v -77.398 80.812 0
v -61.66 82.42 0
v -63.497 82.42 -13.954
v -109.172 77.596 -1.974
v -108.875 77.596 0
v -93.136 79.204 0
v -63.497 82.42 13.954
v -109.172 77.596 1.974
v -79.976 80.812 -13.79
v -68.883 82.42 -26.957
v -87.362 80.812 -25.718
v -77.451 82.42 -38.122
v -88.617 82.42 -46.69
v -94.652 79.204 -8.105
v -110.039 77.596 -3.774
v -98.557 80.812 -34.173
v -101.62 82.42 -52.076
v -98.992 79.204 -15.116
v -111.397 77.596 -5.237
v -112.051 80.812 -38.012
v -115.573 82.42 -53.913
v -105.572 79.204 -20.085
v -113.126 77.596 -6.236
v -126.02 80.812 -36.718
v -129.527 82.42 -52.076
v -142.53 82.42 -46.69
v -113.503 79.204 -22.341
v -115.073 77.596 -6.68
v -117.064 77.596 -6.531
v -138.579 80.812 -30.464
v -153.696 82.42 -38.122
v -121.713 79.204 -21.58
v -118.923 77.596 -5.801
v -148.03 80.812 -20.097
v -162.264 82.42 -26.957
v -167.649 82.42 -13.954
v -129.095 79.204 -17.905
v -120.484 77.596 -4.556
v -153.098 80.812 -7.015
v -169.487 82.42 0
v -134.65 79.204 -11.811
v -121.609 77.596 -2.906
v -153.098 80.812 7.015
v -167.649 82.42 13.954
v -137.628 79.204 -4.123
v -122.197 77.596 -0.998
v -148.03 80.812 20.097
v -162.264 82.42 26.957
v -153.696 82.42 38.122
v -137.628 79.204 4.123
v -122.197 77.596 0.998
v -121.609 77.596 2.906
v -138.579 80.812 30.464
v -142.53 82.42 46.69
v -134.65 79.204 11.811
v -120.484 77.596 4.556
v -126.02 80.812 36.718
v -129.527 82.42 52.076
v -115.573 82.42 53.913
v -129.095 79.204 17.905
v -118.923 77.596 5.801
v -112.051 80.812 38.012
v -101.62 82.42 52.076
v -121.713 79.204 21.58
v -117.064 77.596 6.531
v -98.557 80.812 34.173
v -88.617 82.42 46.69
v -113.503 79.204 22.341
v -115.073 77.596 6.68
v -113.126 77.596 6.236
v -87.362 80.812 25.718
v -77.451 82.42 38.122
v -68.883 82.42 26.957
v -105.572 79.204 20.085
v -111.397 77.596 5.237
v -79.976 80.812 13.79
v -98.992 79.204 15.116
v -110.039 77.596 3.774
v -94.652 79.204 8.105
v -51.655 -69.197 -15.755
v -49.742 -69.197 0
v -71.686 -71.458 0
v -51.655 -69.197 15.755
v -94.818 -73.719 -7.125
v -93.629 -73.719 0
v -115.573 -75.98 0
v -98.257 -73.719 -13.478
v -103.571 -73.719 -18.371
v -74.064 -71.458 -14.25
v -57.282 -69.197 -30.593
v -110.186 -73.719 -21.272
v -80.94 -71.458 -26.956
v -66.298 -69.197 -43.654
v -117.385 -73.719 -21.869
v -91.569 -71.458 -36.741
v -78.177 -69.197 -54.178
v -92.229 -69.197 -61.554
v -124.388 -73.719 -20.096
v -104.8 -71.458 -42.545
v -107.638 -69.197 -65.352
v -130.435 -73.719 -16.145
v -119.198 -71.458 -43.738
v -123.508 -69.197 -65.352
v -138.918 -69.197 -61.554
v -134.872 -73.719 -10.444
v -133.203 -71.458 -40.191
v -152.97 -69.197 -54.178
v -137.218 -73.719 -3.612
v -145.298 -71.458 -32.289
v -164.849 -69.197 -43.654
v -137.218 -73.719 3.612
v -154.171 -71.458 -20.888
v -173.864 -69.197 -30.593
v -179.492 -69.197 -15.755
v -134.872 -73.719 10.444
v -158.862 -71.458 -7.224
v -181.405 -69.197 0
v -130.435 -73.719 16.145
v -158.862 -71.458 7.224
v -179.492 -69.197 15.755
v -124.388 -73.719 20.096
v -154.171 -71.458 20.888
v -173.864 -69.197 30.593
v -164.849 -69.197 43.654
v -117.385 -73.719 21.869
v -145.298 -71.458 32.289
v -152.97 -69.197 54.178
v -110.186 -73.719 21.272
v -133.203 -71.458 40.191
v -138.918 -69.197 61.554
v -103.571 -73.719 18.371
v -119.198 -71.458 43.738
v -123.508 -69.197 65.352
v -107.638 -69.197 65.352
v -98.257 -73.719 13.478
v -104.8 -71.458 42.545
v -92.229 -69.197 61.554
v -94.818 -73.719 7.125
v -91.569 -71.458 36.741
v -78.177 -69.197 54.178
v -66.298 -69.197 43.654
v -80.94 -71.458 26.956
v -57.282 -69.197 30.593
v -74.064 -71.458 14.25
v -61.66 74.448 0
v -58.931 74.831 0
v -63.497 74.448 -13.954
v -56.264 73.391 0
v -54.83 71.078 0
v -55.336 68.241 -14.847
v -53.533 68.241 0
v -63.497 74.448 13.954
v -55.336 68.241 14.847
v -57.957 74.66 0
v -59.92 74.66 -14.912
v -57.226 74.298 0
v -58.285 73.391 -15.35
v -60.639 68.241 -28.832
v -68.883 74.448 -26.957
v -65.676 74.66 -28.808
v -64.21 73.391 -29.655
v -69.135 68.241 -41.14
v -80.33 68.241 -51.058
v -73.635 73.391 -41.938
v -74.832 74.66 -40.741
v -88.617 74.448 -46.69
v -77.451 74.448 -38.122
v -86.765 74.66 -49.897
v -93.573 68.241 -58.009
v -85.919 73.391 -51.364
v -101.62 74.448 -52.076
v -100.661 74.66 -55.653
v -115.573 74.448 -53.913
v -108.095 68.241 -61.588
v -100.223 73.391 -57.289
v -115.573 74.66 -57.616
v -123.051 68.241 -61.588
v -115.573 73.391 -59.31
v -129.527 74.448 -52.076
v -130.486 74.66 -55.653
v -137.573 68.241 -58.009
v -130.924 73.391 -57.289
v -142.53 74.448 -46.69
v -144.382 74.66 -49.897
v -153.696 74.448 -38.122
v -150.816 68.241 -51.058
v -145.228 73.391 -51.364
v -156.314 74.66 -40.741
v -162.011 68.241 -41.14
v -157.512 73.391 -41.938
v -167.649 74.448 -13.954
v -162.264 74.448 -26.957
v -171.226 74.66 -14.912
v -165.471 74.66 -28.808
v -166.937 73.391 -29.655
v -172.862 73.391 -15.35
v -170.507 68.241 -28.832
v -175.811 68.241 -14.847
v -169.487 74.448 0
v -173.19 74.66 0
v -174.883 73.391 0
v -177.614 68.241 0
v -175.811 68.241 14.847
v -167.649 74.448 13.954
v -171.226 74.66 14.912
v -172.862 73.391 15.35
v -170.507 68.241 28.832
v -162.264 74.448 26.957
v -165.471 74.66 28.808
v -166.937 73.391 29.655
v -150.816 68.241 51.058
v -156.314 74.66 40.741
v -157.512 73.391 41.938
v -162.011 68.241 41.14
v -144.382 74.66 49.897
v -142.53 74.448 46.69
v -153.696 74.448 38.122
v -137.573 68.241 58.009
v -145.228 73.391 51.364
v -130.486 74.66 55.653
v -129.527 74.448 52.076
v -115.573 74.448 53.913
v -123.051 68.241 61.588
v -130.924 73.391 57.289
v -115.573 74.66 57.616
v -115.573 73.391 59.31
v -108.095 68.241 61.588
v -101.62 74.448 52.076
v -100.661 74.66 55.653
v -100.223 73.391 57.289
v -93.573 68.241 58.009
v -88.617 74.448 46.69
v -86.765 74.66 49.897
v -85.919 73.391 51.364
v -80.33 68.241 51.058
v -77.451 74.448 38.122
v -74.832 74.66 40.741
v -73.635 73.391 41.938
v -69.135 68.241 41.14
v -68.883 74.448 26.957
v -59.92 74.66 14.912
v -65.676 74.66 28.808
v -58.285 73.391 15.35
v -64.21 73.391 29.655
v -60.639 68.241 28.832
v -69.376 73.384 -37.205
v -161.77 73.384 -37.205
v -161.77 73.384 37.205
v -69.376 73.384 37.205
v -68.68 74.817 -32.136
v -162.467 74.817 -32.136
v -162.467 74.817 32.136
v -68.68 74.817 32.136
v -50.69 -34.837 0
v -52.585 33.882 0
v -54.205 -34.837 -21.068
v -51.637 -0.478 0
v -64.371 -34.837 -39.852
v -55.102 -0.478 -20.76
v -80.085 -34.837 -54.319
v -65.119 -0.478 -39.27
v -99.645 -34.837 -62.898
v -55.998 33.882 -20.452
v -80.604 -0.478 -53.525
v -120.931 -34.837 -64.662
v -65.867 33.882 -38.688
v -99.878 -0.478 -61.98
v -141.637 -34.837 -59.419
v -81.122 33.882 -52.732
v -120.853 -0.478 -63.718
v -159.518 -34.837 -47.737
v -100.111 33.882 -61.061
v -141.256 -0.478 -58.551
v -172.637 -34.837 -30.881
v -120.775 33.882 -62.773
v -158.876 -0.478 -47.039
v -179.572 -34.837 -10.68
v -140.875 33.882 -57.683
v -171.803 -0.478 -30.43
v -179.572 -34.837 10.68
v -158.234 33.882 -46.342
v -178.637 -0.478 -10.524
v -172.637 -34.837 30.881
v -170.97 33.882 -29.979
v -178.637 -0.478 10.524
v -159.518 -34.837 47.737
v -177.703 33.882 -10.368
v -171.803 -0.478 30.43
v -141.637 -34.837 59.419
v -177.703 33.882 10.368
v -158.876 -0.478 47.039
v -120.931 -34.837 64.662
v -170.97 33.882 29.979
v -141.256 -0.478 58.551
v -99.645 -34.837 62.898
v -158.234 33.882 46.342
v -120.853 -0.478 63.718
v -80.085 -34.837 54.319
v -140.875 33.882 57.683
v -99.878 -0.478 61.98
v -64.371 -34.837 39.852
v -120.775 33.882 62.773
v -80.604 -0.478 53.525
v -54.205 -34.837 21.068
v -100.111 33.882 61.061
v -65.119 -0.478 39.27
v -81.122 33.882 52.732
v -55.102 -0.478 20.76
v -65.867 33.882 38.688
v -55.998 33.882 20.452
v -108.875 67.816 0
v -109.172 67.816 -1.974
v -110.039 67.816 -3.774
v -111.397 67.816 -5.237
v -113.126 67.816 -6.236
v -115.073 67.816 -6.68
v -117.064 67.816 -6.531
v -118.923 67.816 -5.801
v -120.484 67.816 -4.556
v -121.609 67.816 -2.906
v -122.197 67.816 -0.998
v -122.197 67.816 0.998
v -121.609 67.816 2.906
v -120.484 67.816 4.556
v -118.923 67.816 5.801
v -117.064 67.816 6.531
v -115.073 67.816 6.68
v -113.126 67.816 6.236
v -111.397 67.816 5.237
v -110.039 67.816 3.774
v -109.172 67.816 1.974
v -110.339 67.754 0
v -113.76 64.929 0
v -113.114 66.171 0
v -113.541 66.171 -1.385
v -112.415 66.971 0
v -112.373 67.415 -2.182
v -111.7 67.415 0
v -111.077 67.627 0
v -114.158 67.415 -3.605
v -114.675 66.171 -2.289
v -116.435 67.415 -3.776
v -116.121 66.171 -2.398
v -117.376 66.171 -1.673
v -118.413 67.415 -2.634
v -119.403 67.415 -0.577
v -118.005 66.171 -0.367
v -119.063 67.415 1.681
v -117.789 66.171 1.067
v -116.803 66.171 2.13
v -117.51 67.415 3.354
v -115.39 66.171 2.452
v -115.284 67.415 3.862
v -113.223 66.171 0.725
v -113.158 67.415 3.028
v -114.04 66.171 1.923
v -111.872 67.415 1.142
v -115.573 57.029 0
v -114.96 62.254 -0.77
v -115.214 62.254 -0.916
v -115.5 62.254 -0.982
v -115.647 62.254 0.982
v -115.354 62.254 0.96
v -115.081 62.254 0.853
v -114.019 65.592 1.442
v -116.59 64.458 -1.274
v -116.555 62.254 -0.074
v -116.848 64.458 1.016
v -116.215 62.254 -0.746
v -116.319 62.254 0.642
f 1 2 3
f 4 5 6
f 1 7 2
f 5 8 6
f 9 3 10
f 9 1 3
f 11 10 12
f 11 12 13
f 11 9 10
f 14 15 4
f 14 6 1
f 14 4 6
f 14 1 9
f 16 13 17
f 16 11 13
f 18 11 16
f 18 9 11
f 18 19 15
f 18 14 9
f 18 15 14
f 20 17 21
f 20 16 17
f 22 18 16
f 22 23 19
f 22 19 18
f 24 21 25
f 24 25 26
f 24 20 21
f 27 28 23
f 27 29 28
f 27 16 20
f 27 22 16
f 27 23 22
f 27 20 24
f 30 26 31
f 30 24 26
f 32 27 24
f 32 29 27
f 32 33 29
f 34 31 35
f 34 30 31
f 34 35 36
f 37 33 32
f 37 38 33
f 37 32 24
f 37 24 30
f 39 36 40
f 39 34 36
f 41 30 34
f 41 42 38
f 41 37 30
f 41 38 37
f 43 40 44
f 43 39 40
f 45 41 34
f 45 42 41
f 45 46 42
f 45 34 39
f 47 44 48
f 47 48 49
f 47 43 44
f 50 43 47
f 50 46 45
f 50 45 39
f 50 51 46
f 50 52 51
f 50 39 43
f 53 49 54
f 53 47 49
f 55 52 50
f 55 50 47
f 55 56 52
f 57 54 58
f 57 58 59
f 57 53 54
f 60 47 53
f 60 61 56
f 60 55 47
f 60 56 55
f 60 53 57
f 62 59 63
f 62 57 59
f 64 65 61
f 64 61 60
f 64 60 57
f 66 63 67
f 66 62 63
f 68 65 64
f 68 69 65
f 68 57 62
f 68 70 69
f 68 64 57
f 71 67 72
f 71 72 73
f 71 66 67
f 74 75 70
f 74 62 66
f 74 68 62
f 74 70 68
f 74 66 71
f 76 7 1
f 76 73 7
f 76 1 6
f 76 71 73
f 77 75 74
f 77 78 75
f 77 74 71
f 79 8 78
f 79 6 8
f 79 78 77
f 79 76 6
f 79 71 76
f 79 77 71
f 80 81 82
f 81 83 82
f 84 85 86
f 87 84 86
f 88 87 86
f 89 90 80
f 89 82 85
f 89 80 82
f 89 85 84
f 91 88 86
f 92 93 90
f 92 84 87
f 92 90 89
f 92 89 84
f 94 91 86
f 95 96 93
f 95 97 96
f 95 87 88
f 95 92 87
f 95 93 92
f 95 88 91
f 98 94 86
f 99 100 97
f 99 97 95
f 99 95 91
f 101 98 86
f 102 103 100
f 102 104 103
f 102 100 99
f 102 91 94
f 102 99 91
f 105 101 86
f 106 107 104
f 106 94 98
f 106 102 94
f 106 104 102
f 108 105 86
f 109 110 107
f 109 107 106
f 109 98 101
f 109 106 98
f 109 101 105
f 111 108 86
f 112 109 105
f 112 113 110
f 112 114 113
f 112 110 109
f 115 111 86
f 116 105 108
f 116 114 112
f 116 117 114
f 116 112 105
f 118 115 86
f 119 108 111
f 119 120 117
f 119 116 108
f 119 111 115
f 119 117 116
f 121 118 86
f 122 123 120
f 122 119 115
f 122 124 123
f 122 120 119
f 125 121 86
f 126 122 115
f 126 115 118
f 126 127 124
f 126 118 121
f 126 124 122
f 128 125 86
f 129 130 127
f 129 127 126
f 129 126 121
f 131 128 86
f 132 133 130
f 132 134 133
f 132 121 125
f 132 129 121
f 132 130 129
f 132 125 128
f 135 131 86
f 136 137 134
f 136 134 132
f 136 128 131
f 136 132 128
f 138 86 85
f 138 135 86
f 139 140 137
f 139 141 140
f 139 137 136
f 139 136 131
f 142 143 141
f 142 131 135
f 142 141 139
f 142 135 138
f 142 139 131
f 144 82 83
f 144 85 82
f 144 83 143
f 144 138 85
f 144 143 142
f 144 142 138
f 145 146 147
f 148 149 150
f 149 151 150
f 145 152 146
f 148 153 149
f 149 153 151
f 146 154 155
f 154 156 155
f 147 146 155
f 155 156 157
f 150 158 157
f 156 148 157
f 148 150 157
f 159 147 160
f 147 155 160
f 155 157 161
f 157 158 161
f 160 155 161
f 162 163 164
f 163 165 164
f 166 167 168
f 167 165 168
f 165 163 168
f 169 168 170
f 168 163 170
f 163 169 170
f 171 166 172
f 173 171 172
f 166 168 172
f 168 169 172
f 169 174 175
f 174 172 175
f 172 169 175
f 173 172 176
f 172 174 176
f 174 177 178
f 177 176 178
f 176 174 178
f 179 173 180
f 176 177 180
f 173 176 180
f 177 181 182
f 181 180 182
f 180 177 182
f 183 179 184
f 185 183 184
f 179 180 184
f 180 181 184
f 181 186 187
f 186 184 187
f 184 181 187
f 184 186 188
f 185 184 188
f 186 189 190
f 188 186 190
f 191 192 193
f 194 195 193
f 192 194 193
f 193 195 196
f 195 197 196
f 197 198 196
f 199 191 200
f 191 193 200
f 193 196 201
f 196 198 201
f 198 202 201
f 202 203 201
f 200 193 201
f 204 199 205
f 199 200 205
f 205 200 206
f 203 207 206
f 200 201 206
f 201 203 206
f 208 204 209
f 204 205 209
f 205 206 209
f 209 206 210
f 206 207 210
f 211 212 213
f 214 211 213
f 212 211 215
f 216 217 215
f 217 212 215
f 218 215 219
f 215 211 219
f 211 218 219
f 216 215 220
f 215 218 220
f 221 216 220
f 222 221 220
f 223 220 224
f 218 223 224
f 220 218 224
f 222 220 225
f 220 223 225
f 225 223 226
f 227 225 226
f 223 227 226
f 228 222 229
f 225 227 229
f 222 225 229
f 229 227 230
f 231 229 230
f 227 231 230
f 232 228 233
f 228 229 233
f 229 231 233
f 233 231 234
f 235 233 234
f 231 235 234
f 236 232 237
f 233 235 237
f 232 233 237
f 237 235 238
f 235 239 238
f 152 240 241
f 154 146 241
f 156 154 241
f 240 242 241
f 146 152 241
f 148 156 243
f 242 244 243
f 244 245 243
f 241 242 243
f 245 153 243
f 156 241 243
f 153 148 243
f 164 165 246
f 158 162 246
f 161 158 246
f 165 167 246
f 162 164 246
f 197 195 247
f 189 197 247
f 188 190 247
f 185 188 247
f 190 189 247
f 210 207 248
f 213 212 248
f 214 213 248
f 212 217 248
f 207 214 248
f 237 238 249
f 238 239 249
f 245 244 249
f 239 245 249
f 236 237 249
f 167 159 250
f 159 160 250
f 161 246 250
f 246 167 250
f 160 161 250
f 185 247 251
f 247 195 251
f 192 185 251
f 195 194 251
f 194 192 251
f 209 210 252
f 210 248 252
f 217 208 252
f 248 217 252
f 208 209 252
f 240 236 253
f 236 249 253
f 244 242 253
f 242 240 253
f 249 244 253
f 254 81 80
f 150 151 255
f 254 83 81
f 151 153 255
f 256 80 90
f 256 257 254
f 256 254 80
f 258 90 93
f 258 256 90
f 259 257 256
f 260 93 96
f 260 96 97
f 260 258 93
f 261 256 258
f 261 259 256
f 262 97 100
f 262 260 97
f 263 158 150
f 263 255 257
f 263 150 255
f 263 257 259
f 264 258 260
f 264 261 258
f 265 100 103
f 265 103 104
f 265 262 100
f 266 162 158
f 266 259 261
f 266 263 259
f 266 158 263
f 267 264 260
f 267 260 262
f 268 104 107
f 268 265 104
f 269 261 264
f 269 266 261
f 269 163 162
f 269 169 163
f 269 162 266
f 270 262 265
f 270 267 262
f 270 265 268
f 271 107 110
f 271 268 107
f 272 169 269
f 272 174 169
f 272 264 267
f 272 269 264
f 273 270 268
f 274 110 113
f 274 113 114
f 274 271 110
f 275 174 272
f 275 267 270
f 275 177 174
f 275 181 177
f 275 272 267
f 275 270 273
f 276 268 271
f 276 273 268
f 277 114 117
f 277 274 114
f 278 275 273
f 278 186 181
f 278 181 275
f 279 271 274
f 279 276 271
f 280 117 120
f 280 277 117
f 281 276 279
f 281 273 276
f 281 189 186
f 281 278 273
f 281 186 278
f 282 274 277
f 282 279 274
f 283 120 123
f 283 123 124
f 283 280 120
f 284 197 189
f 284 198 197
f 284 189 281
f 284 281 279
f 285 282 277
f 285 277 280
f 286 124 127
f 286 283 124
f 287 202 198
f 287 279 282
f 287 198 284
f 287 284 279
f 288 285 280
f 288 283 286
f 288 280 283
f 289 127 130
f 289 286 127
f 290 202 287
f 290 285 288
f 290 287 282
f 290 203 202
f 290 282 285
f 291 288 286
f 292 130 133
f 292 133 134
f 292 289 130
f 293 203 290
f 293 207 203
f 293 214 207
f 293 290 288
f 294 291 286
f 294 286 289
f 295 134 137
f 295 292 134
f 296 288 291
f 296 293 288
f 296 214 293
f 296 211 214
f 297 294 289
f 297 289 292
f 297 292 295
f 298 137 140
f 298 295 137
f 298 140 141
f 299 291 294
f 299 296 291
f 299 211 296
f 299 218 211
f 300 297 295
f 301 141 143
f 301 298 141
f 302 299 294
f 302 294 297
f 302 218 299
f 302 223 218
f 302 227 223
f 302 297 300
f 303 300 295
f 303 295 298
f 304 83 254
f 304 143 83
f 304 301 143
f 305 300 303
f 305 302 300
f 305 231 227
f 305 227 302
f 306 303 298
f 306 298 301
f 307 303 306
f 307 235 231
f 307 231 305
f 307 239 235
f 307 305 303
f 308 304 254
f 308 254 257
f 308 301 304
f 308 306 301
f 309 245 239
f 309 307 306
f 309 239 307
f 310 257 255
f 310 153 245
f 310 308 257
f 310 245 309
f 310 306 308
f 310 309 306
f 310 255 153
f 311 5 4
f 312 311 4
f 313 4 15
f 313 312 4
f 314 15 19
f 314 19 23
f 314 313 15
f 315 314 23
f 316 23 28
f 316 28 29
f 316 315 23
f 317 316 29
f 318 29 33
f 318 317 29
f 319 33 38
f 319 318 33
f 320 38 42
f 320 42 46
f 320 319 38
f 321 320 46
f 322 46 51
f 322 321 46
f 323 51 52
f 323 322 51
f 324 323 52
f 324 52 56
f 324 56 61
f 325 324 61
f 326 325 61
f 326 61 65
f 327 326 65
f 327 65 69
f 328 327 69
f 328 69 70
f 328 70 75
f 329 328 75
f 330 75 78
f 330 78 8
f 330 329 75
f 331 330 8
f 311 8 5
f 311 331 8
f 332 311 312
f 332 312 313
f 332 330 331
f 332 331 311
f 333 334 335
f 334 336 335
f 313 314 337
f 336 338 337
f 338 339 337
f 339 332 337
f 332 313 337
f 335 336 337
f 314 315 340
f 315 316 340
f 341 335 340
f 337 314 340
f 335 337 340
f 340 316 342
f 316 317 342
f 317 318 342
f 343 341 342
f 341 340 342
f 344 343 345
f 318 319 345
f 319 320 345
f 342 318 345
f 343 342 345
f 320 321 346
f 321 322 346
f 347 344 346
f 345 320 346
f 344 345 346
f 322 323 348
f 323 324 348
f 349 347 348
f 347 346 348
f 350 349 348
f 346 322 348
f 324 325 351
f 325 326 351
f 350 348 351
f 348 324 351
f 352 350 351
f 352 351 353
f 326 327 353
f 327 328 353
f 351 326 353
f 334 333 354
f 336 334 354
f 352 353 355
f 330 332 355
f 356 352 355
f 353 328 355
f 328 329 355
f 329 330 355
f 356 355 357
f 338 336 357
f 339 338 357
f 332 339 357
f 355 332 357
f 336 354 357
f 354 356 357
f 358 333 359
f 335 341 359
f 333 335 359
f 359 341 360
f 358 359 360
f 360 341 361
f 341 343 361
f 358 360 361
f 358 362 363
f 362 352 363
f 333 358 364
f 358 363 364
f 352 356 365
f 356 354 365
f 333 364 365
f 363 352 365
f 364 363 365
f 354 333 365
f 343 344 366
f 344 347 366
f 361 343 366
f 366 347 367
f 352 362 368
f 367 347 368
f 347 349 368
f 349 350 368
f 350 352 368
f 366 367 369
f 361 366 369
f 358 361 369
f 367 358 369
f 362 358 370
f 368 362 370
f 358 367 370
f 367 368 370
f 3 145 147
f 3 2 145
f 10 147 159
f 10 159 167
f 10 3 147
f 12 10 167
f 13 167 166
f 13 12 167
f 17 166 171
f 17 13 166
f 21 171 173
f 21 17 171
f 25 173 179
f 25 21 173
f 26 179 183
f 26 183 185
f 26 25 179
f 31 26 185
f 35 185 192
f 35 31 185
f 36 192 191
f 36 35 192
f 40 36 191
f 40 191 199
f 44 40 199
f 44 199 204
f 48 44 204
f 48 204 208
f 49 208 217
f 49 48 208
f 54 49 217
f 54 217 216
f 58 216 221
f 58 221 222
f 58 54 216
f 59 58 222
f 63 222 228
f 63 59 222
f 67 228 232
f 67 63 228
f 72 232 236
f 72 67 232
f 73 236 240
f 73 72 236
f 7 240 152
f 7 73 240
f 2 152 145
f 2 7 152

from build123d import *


with BuildPart() as f1:
    # F0 (on Top) → F1 (revolve)
    with BuildSketch(Plane.XY):
        with BuildLine():
            Line((-115.5733242631, 57.0293739438), (-115.5733242631, -75.9797766805))
            Line((-115.5733242631, -75.9797766805), (-49.7417673469, -69.1965743899))
            Line((-49.7417673469, -69.1965743899), (-53.5328015685, 68.2412087917))
            add(Edge.make_bspline(
                [(-61.6601034999, 74.4477882981), (-60.1760774382, 74.783803467), (-56.7265722306, 75.5648450568), (-54.6920458476, 70.8994721239), (-53.5328015685, 68.2412087917)],
                knots=[0, 0, 0, 0, 0.4302141822, 1, 1, 1, 1], degree=3))
            Line((-61.6601034999, 74.4477882981), (-61.6601034999, 82.4199629432))
            Line((-61.6601034999, 82.4199629432), (-108.8746339083, 77.5962844491))
            Line((-108.8746339083, 77.5962844491), (-108.8746339083, 67.8164288402))
            add(Edge.make_bspline(
                [(-115.5733242631, 57.0293739438), (-114.8918775977, 61.1384455934), (-113.7933541673, 67.7624584675), (-110.2282124707, 67.8015767779), (-108.8746339083, 67.8164288402)],
                knots=[0, 0, 0, 0, 0.6203296593, 1, 1, 1, 1], degree=3))
        make_face()
    revolve(axis=Axis((-115.5733242631, -9.4752013683, 0), (0, 1, 0)))


solid = f1.part
